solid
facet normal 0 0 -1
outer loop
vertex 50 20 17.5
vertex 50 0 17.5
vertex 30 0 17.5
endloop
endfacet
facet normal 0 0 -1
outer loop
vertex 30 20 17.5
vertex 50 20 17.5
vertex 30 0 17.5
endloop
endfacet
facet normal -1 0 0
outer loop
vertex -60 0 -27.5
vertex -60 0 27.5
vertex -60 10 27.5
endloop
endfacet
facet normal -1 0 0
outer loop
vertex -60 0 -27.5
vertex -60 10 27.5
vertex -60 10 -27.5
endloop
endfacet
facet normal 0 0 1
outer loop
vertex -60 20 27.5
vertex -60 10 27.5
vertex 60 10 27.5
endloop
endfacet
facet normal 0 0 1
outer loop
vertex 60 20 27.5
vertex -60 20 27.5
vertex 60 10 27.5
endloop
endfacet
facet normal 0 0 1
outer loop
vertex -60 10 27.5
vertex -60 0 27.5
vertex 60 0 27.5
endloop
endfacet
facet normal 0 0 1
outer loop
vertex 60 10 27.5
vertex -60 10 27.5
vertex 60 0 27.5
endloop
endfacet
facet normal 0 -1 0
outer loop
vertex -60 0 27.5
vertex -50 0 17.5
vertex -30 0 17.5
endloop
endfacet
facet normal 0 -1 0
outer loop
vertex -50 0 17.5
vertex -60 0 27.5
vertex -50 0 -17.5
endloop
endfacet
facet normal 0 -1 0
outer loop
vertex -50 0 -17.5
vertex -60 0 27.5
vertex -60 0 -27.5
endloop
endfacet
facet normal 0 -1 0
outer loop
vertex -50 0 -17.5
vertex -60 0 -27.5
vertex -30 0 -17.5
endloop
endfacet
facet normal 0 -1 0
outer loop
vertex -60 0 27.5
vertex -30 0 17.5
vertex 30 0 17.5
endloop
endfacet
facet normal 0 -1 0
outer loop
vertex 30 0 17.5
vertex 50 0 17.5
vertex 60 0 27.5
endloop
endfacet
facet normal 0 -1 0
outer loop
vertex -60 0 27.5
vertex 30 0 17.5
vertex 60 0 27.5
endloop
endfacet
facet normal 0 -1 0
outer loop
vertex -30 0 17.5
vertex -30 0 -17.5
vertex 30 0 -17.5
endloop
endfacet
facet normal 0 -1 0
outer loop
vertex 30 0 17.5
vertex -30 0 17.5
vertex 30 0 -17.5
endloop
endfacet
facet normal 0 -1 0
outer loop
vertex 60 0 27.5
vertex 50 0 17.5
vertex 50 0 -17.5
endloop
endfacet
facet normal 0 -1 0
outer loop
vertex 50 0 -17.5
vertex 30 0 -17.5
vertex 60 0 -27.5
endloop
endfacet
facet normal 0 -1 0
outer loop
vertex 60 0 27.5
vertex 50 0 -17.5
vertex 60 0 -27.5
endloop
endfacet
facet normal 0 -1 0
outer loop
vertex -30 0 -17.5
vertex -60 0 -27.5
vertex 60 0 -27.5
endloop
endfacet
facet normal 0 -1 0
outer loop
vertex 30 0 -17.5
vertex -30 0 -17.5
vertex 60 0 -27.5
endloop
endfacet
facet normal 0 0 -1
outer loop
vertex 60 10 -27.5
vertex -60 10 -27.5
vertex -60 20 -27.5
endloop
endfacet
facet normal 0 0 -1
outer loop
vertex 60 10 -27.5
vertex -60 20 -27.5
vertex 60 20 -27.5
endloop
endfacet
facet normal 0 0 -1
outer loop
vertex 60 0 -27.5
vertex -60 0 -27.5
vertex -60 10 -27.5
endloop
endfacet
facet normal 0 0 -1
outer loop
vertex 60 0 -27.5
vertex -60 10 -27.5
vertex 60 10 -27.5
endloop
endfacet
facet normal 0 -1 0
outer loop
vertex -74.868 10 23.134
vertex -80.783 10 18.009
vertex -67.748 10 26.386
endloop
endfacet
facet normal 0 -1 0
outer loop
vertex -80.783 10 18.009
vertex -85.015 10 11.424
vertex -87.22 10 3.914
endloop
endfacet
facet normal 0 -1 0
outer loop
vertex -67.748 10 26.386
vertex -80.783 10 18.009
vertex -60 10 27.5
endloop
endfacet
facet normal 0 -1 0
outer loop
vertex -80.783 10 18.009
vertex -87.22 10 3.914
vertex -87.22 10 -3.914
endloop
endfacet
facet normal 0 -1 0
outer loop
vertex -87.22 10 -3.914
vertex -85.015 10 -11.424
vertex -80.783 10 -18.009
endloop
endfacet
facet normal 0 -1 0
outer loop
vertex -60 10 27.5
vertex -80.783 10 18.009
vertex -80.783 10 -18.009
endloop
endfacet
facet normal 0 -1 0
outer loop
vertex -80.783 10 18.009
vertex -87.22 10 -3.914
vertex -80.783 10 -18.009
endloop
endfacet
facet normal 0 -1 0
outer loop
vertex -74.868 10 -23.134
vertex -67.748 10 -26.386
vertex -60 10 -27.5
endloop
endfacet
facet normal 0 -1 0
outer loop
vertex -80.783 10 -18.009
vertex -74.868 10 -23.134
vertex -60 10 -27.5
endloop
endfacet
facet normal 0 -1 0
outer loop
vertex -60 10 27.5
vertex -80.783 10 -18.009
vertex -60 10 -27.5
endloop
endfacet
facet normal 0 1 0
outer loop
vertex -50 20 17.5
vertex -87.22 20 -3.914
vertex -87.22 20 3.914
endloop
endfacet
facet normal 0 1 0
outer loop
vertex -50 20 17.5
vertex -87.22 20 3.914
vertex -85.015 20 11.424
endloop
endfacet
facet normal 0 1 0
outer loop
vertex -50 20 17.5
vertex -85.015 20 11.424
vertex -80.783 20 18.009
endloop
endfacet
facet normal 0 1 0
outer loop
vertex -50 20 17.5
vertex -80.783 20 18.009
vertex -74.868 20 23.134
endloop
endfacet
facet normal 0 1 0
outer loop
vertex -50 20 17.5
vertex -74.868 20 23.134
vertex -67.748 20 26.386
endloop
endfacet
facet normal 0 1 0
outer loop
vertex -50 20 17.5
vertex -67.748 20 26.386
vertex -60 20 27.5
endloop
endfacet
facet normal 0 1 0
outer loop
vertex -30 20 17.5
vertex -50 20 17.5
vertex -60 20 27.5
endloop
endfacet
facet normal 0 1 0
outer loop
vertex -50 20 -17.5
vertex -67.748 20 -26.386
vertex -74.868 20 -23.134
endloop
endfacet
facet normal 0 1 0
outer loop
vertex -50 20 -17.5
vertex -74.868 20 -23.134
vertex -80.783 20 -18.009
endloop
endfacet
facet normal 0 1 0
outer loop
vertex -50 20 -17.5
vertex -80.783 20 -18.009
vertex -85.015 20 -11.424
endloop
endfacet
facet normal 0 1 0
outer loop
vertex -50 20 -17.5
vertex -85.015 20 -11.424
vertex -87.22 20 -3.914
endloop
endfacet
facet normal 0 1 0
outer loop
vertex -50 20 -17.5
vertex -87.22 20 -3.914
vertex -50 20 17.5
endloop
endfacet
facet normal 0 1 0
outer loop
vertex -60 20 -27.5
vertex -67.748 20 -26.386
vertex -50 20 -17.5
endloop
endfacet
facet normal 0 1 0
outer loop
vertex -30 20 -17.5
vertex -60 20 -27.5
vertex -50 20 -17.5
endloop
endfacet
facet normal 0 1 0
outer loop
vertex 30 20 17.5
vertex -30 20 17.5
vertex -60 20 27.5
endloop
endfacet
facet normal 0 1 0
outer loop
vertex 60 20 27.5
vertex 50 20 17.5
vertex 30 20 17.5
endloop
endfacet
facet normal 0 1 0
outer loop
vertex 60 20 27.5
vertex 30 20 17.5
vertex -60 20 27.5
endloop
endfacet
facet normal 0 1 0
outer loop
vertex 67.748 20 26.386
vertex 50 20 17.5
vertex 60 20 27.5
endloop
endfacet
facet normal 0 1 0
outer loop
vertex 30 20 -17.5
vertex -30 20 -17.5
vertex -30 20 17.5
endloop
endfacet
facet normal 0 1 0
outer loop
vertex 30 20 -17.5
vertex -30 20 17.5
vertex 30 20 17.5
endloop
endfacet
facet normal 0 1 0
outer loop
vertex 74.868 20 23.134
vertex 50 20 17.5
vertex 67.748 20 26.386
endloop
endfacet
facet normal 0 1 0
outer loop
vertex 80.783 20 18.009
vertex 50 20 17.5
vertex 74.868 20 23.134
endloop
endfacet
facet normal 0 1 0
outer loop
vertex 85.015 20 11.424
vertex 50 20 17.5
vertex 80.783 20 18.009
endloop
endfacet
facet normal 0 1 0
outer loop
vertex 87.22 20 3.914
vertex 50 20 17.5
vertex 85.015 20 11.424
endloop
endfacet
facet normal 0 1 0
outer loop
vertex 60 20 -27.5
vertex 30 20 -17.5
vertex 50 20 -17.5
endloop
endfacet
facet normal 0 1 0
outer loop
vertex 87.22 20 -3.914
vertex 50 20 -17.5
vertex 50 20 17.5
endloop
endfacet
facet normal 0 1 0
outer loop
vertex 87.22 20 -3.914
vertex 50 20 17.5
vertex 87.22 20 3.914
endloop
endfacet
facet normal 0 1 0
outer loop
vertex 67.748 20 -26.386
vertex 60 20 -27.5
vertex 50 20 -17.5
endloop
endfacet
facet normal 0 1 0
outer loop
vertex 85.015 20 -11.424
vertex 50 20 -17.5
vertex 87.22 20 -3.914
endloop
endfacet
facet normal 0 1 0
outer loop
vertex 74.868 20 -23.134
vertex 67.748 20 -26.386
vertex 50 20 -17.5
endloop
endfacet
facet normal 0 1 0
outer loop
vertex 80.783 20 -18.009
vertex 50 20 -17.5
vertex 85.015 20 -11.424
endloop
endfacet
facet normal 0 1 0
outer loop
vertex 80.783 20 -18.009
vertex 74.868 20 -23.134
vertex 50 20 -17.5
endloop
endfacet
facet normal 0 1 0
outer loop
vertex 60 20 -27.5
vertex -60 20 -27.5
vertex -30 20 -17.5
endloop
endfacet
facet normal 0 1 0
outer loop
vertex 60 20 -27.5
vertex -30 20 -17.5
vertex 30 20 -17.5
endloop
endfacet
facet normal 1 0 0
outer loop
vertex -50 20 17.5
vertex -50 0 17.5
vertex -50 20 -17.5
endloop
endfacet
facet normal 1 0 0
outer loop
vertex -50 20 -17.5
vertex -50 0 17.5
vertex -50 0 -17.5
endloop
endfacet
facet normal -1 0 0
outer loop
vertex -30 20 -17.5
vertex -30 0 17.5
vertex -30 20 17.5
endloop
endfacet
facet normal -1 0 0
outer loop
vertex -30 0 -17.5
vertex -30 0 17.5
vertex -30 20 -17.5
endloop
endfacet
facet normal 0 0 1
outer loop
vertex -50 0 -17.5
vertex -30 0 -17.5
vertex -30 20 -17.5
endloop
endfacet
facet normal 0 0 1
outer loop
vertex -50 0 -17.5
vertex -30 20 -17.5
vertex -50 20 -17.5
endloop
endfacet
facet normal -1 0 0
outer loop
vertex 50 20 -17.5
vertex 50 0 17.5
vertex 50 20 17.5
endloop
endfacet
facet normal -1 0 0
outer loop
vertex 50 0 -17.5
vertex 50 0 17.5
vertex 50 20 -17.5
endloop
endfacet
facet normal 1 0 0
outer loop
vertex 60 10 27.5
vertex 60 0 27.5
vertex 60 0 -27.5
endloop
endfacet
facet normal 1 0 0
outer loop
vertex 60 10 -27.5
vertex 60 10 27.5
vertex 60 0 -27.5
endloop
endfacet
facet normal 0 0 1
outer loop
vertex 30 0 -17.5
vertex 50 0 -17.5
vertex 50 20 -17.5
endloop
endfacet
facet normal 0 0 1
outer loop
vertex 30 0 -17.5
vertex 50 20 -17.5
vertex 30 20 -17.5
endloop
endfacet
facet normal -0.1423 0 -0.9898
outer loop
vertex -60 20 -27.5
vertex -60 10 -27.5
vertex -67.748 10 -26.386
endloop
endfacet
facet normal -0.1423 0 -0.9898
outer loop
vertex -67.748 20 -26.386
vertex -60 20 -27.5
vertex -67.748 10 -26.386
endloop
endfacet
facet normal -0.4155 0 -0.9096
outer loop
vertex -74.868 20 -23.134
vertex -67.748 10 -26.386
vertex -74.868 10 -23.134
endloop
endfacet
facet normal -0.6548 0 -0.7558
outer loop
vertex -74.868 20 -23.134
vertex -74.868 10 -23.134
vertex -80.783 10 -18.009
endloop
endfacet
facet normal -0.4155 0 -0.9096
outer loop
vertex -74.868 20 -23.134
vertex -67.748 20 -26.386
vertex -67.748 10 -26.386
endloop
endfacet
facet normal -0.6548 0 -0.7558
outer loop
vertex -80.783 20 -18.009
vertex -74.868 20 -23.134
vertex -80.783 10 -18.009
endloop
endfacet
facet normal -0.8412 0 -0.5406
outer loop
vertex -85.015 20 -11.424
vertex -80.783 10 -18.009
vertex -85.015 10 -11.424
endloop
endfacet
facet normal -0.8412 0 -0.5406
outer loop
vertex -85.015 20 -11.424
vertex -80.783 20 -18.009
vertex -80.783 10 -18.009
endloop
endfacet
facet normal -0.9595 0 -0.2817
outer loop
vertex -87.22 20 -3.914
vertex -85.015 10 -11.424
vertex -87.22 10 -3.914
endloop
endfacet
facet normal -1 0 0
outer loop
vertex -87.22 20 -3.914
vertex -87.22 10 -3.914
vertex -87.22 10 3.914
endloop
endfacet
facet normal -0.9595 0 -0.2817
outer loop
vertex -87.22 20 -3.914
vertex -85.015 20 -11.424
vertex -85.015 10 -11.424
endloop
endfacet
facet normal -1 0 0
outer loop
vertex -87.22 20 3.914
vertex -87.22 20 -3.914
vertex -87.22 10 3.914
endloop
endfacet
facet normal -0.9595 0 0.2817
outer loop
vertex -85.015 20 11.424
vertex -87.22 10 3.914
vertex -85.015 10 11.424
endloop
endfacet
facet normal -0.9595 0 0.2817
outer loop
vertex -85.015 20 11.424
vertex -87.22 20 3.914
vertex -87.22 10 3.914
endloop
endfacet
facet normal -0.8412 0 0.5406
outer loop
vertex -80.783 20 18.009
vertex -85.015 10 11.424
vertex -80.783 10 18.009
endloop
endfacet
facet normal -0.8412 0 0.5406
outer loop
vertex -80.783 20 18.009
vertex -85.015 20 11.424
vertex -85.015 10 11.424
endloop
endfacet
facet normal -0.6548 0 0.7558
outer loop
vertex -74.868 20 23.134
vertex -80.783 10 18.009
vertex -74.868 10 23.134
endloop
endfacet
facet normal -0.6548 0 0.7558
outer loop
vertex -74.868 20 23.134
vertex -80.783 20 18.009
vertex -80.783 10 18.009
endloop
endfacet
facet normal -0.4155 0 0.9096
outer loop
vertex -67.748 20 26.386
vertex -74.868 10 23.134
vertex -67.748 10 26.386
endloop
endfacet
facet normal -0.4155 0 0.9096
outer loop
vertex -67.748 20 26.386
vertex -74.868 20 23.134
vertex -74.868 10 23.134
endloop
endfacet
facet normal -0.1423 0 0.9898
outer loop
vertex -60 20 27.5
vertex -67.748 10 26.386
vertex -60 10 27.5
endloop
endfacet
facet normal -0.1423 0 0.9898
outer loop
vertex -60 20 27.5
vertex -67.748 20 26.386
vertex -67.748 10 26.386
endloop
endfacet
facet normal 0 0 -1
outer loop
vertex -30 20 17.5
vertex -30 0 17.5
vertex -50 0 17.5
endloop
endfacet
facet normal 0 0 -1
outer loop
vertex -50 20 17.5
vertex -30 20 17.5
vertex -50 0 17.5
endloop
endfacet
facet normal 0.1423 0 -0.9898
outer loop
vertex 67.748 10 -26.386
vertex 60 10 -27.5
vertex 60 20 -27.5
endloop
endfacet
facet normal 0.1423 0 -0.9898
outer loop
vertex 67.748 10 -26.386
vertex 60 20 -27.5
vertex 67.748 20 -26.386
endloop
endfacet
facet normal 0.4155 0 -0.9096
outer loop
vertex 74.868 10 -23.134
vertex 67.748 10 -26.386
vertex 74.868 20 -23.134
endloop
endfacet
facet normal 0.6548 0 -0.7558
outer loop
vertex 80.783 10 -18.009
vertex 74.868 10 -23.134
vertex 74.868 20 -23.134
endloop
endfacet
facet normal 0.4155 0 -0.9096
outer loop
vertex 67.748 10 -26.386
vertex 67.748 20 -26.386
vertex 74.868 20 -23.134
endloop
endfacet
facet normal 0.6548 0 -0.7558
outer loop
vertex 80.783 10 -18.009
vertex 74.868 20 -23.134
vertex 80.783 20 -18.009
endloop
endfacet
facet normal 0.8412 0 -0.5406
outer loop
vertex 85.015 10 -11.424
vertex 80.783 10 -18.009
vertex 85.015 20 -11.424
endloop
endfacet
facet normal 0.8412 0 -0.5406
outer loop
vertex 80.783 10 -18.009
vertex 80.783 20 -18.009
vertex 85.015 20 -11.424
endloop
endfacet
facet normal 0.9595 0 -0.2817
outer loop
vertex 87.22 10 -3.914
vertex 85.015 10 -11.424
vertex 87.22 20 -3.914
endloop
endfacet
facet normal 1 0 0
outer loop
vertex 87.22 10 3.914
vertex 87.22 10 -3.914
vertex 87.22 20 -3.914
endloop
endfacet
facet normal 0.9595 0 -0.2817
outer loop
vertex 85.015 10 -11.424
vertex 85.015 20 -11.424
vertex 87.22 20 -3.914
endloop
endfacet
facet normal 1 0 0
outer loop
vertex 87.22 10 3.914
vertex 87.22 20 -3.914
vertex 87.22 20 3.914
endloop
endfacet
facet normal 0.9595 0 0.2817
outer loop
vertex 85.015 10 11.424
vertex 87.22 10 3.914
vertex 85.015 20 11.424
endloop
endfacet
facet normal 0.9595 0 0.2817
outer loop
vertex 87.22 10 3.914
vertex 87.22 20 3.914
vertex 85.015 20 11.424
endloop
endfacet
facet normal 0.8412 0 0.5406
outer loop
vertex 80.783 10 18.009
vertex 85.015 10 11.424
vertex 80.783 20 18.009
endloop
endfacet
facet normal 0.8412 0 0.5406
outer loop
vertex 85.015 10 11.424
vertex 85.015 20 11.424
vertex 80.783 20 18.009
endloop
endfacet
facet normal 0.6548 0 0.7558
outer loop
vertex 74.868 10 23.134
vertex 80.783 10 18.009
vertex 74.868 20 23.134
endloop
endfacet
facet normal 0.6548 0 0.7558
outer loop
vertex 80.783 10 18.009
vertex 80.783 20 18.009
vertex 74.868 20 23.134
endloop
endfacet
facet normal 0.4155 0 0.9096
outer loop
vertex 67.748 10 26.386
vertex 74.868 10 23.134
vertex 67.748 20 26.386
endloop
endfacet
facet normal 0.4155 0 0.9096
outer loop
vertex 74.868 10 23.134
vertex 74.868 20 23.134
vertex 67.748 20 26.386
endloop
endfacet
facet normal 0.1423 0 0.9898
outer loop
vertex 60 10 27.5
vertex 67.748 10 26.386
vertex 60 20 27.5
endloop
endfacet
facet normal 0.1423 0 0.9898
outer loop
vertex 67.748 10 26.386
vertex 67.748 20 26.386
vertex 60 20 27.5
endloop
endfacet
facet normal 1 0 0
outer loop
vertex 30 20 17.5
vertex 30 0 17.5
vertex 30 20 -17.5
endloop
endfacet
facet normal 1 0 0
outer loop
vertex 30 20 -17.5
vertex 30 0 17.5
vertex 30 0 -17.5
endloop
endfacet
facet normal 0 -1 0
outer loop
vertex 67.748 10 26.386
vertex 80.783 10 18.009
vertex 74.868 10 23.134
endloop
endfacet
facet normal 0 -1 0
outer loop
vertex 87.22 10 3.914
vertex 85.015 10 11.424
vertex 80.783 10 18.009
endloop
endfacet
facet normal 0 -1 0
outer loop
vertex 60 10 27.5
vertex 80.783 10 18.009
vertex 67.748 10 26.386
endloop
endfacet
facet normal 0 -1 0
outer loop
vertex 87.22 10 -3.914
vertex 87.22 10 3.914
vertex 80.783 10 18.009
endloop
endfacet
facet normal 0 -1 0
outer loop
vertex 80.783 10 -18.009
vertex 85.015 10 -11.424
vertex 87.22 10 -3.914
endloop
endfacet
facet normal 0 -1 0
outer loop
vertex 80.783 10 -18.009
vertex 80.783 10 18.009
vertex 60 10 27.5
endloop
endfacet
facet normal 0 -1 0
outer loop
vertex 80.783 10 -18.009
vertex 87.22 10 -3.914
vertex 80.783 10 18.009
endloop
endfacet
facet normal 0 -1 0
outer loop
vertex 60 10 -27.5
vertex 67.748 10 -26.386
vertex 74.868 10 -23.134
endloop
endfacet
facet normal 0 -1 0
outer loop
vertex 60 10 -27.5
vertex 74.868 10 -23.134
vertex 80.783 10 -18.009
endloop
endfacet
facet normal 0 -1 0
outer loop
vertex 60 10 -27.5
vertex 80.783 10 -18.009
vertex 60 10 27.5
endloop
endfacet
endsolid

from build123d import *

# Parameters (mm, degrees)
SKETCH2_W           = 120
SKETCH2_H           = 55
BOSS_EXTRUDE1_DEPTH = 20
SKETCH3_W           = 20
SKETCH3_H           = 35
CUT_EXTRUDE1_DEPTH  = 20
BOSS_EXTRUDE2_DEPTH = 10


with BuildPart() as part:
    # Sketch2 → Boss-Extrude1 (new body)
    with BuildSketch(Plane(origin=(0, 0, 0), x_dir=(1, 0, 0), z_dir=(0, 1, 0))):
        Rectangle(SKETCH2_W, SKETCH2_H)
    extrude(amount=BOSS_EXTRUDE1_DEPTH)

    # Sketch3 → Cut-Extrude1 (cut)
    with BuildSketch(Plane(origin=(0, 0, 0), x_dir=(-1, 0, 0), z_dir=(0, -1, 0))):
        with Locations((40, 0)):
            Rectangle(SKETCH3_W, SKETCH3_H)
        with Locations((-40, 0)):
            Rectangle(SKETCH3_W, SKETCH3_H)
    extrude(amount=-CUT_EXTRUDE1_DEPTH, mode=Mode.SUBTRACT)

    # Sketch4 → Boss-Extrude2 (add)
    with BuildSketch(Plane(origin=(0, 20, 0), x_dir=(1, 0, 0), z_dir=(0, 1, 0))):
        with BuildLine():
            ThreePointArc((-60, 27.5), (-87.5, 0), (-60, -27.5))
            Line((-60, -27.5), (-60, 27.5))
        make_face()
        with BuildLine():
            ThreePointArc((60, 27.5), (87.5, 0), (60, -27.5))
            Line((60, -27.5), (60, 27.5))
        make_face()
    extrude(amount=-BOSS_EXTRUDE2_DEPTH)


solid = part.part
